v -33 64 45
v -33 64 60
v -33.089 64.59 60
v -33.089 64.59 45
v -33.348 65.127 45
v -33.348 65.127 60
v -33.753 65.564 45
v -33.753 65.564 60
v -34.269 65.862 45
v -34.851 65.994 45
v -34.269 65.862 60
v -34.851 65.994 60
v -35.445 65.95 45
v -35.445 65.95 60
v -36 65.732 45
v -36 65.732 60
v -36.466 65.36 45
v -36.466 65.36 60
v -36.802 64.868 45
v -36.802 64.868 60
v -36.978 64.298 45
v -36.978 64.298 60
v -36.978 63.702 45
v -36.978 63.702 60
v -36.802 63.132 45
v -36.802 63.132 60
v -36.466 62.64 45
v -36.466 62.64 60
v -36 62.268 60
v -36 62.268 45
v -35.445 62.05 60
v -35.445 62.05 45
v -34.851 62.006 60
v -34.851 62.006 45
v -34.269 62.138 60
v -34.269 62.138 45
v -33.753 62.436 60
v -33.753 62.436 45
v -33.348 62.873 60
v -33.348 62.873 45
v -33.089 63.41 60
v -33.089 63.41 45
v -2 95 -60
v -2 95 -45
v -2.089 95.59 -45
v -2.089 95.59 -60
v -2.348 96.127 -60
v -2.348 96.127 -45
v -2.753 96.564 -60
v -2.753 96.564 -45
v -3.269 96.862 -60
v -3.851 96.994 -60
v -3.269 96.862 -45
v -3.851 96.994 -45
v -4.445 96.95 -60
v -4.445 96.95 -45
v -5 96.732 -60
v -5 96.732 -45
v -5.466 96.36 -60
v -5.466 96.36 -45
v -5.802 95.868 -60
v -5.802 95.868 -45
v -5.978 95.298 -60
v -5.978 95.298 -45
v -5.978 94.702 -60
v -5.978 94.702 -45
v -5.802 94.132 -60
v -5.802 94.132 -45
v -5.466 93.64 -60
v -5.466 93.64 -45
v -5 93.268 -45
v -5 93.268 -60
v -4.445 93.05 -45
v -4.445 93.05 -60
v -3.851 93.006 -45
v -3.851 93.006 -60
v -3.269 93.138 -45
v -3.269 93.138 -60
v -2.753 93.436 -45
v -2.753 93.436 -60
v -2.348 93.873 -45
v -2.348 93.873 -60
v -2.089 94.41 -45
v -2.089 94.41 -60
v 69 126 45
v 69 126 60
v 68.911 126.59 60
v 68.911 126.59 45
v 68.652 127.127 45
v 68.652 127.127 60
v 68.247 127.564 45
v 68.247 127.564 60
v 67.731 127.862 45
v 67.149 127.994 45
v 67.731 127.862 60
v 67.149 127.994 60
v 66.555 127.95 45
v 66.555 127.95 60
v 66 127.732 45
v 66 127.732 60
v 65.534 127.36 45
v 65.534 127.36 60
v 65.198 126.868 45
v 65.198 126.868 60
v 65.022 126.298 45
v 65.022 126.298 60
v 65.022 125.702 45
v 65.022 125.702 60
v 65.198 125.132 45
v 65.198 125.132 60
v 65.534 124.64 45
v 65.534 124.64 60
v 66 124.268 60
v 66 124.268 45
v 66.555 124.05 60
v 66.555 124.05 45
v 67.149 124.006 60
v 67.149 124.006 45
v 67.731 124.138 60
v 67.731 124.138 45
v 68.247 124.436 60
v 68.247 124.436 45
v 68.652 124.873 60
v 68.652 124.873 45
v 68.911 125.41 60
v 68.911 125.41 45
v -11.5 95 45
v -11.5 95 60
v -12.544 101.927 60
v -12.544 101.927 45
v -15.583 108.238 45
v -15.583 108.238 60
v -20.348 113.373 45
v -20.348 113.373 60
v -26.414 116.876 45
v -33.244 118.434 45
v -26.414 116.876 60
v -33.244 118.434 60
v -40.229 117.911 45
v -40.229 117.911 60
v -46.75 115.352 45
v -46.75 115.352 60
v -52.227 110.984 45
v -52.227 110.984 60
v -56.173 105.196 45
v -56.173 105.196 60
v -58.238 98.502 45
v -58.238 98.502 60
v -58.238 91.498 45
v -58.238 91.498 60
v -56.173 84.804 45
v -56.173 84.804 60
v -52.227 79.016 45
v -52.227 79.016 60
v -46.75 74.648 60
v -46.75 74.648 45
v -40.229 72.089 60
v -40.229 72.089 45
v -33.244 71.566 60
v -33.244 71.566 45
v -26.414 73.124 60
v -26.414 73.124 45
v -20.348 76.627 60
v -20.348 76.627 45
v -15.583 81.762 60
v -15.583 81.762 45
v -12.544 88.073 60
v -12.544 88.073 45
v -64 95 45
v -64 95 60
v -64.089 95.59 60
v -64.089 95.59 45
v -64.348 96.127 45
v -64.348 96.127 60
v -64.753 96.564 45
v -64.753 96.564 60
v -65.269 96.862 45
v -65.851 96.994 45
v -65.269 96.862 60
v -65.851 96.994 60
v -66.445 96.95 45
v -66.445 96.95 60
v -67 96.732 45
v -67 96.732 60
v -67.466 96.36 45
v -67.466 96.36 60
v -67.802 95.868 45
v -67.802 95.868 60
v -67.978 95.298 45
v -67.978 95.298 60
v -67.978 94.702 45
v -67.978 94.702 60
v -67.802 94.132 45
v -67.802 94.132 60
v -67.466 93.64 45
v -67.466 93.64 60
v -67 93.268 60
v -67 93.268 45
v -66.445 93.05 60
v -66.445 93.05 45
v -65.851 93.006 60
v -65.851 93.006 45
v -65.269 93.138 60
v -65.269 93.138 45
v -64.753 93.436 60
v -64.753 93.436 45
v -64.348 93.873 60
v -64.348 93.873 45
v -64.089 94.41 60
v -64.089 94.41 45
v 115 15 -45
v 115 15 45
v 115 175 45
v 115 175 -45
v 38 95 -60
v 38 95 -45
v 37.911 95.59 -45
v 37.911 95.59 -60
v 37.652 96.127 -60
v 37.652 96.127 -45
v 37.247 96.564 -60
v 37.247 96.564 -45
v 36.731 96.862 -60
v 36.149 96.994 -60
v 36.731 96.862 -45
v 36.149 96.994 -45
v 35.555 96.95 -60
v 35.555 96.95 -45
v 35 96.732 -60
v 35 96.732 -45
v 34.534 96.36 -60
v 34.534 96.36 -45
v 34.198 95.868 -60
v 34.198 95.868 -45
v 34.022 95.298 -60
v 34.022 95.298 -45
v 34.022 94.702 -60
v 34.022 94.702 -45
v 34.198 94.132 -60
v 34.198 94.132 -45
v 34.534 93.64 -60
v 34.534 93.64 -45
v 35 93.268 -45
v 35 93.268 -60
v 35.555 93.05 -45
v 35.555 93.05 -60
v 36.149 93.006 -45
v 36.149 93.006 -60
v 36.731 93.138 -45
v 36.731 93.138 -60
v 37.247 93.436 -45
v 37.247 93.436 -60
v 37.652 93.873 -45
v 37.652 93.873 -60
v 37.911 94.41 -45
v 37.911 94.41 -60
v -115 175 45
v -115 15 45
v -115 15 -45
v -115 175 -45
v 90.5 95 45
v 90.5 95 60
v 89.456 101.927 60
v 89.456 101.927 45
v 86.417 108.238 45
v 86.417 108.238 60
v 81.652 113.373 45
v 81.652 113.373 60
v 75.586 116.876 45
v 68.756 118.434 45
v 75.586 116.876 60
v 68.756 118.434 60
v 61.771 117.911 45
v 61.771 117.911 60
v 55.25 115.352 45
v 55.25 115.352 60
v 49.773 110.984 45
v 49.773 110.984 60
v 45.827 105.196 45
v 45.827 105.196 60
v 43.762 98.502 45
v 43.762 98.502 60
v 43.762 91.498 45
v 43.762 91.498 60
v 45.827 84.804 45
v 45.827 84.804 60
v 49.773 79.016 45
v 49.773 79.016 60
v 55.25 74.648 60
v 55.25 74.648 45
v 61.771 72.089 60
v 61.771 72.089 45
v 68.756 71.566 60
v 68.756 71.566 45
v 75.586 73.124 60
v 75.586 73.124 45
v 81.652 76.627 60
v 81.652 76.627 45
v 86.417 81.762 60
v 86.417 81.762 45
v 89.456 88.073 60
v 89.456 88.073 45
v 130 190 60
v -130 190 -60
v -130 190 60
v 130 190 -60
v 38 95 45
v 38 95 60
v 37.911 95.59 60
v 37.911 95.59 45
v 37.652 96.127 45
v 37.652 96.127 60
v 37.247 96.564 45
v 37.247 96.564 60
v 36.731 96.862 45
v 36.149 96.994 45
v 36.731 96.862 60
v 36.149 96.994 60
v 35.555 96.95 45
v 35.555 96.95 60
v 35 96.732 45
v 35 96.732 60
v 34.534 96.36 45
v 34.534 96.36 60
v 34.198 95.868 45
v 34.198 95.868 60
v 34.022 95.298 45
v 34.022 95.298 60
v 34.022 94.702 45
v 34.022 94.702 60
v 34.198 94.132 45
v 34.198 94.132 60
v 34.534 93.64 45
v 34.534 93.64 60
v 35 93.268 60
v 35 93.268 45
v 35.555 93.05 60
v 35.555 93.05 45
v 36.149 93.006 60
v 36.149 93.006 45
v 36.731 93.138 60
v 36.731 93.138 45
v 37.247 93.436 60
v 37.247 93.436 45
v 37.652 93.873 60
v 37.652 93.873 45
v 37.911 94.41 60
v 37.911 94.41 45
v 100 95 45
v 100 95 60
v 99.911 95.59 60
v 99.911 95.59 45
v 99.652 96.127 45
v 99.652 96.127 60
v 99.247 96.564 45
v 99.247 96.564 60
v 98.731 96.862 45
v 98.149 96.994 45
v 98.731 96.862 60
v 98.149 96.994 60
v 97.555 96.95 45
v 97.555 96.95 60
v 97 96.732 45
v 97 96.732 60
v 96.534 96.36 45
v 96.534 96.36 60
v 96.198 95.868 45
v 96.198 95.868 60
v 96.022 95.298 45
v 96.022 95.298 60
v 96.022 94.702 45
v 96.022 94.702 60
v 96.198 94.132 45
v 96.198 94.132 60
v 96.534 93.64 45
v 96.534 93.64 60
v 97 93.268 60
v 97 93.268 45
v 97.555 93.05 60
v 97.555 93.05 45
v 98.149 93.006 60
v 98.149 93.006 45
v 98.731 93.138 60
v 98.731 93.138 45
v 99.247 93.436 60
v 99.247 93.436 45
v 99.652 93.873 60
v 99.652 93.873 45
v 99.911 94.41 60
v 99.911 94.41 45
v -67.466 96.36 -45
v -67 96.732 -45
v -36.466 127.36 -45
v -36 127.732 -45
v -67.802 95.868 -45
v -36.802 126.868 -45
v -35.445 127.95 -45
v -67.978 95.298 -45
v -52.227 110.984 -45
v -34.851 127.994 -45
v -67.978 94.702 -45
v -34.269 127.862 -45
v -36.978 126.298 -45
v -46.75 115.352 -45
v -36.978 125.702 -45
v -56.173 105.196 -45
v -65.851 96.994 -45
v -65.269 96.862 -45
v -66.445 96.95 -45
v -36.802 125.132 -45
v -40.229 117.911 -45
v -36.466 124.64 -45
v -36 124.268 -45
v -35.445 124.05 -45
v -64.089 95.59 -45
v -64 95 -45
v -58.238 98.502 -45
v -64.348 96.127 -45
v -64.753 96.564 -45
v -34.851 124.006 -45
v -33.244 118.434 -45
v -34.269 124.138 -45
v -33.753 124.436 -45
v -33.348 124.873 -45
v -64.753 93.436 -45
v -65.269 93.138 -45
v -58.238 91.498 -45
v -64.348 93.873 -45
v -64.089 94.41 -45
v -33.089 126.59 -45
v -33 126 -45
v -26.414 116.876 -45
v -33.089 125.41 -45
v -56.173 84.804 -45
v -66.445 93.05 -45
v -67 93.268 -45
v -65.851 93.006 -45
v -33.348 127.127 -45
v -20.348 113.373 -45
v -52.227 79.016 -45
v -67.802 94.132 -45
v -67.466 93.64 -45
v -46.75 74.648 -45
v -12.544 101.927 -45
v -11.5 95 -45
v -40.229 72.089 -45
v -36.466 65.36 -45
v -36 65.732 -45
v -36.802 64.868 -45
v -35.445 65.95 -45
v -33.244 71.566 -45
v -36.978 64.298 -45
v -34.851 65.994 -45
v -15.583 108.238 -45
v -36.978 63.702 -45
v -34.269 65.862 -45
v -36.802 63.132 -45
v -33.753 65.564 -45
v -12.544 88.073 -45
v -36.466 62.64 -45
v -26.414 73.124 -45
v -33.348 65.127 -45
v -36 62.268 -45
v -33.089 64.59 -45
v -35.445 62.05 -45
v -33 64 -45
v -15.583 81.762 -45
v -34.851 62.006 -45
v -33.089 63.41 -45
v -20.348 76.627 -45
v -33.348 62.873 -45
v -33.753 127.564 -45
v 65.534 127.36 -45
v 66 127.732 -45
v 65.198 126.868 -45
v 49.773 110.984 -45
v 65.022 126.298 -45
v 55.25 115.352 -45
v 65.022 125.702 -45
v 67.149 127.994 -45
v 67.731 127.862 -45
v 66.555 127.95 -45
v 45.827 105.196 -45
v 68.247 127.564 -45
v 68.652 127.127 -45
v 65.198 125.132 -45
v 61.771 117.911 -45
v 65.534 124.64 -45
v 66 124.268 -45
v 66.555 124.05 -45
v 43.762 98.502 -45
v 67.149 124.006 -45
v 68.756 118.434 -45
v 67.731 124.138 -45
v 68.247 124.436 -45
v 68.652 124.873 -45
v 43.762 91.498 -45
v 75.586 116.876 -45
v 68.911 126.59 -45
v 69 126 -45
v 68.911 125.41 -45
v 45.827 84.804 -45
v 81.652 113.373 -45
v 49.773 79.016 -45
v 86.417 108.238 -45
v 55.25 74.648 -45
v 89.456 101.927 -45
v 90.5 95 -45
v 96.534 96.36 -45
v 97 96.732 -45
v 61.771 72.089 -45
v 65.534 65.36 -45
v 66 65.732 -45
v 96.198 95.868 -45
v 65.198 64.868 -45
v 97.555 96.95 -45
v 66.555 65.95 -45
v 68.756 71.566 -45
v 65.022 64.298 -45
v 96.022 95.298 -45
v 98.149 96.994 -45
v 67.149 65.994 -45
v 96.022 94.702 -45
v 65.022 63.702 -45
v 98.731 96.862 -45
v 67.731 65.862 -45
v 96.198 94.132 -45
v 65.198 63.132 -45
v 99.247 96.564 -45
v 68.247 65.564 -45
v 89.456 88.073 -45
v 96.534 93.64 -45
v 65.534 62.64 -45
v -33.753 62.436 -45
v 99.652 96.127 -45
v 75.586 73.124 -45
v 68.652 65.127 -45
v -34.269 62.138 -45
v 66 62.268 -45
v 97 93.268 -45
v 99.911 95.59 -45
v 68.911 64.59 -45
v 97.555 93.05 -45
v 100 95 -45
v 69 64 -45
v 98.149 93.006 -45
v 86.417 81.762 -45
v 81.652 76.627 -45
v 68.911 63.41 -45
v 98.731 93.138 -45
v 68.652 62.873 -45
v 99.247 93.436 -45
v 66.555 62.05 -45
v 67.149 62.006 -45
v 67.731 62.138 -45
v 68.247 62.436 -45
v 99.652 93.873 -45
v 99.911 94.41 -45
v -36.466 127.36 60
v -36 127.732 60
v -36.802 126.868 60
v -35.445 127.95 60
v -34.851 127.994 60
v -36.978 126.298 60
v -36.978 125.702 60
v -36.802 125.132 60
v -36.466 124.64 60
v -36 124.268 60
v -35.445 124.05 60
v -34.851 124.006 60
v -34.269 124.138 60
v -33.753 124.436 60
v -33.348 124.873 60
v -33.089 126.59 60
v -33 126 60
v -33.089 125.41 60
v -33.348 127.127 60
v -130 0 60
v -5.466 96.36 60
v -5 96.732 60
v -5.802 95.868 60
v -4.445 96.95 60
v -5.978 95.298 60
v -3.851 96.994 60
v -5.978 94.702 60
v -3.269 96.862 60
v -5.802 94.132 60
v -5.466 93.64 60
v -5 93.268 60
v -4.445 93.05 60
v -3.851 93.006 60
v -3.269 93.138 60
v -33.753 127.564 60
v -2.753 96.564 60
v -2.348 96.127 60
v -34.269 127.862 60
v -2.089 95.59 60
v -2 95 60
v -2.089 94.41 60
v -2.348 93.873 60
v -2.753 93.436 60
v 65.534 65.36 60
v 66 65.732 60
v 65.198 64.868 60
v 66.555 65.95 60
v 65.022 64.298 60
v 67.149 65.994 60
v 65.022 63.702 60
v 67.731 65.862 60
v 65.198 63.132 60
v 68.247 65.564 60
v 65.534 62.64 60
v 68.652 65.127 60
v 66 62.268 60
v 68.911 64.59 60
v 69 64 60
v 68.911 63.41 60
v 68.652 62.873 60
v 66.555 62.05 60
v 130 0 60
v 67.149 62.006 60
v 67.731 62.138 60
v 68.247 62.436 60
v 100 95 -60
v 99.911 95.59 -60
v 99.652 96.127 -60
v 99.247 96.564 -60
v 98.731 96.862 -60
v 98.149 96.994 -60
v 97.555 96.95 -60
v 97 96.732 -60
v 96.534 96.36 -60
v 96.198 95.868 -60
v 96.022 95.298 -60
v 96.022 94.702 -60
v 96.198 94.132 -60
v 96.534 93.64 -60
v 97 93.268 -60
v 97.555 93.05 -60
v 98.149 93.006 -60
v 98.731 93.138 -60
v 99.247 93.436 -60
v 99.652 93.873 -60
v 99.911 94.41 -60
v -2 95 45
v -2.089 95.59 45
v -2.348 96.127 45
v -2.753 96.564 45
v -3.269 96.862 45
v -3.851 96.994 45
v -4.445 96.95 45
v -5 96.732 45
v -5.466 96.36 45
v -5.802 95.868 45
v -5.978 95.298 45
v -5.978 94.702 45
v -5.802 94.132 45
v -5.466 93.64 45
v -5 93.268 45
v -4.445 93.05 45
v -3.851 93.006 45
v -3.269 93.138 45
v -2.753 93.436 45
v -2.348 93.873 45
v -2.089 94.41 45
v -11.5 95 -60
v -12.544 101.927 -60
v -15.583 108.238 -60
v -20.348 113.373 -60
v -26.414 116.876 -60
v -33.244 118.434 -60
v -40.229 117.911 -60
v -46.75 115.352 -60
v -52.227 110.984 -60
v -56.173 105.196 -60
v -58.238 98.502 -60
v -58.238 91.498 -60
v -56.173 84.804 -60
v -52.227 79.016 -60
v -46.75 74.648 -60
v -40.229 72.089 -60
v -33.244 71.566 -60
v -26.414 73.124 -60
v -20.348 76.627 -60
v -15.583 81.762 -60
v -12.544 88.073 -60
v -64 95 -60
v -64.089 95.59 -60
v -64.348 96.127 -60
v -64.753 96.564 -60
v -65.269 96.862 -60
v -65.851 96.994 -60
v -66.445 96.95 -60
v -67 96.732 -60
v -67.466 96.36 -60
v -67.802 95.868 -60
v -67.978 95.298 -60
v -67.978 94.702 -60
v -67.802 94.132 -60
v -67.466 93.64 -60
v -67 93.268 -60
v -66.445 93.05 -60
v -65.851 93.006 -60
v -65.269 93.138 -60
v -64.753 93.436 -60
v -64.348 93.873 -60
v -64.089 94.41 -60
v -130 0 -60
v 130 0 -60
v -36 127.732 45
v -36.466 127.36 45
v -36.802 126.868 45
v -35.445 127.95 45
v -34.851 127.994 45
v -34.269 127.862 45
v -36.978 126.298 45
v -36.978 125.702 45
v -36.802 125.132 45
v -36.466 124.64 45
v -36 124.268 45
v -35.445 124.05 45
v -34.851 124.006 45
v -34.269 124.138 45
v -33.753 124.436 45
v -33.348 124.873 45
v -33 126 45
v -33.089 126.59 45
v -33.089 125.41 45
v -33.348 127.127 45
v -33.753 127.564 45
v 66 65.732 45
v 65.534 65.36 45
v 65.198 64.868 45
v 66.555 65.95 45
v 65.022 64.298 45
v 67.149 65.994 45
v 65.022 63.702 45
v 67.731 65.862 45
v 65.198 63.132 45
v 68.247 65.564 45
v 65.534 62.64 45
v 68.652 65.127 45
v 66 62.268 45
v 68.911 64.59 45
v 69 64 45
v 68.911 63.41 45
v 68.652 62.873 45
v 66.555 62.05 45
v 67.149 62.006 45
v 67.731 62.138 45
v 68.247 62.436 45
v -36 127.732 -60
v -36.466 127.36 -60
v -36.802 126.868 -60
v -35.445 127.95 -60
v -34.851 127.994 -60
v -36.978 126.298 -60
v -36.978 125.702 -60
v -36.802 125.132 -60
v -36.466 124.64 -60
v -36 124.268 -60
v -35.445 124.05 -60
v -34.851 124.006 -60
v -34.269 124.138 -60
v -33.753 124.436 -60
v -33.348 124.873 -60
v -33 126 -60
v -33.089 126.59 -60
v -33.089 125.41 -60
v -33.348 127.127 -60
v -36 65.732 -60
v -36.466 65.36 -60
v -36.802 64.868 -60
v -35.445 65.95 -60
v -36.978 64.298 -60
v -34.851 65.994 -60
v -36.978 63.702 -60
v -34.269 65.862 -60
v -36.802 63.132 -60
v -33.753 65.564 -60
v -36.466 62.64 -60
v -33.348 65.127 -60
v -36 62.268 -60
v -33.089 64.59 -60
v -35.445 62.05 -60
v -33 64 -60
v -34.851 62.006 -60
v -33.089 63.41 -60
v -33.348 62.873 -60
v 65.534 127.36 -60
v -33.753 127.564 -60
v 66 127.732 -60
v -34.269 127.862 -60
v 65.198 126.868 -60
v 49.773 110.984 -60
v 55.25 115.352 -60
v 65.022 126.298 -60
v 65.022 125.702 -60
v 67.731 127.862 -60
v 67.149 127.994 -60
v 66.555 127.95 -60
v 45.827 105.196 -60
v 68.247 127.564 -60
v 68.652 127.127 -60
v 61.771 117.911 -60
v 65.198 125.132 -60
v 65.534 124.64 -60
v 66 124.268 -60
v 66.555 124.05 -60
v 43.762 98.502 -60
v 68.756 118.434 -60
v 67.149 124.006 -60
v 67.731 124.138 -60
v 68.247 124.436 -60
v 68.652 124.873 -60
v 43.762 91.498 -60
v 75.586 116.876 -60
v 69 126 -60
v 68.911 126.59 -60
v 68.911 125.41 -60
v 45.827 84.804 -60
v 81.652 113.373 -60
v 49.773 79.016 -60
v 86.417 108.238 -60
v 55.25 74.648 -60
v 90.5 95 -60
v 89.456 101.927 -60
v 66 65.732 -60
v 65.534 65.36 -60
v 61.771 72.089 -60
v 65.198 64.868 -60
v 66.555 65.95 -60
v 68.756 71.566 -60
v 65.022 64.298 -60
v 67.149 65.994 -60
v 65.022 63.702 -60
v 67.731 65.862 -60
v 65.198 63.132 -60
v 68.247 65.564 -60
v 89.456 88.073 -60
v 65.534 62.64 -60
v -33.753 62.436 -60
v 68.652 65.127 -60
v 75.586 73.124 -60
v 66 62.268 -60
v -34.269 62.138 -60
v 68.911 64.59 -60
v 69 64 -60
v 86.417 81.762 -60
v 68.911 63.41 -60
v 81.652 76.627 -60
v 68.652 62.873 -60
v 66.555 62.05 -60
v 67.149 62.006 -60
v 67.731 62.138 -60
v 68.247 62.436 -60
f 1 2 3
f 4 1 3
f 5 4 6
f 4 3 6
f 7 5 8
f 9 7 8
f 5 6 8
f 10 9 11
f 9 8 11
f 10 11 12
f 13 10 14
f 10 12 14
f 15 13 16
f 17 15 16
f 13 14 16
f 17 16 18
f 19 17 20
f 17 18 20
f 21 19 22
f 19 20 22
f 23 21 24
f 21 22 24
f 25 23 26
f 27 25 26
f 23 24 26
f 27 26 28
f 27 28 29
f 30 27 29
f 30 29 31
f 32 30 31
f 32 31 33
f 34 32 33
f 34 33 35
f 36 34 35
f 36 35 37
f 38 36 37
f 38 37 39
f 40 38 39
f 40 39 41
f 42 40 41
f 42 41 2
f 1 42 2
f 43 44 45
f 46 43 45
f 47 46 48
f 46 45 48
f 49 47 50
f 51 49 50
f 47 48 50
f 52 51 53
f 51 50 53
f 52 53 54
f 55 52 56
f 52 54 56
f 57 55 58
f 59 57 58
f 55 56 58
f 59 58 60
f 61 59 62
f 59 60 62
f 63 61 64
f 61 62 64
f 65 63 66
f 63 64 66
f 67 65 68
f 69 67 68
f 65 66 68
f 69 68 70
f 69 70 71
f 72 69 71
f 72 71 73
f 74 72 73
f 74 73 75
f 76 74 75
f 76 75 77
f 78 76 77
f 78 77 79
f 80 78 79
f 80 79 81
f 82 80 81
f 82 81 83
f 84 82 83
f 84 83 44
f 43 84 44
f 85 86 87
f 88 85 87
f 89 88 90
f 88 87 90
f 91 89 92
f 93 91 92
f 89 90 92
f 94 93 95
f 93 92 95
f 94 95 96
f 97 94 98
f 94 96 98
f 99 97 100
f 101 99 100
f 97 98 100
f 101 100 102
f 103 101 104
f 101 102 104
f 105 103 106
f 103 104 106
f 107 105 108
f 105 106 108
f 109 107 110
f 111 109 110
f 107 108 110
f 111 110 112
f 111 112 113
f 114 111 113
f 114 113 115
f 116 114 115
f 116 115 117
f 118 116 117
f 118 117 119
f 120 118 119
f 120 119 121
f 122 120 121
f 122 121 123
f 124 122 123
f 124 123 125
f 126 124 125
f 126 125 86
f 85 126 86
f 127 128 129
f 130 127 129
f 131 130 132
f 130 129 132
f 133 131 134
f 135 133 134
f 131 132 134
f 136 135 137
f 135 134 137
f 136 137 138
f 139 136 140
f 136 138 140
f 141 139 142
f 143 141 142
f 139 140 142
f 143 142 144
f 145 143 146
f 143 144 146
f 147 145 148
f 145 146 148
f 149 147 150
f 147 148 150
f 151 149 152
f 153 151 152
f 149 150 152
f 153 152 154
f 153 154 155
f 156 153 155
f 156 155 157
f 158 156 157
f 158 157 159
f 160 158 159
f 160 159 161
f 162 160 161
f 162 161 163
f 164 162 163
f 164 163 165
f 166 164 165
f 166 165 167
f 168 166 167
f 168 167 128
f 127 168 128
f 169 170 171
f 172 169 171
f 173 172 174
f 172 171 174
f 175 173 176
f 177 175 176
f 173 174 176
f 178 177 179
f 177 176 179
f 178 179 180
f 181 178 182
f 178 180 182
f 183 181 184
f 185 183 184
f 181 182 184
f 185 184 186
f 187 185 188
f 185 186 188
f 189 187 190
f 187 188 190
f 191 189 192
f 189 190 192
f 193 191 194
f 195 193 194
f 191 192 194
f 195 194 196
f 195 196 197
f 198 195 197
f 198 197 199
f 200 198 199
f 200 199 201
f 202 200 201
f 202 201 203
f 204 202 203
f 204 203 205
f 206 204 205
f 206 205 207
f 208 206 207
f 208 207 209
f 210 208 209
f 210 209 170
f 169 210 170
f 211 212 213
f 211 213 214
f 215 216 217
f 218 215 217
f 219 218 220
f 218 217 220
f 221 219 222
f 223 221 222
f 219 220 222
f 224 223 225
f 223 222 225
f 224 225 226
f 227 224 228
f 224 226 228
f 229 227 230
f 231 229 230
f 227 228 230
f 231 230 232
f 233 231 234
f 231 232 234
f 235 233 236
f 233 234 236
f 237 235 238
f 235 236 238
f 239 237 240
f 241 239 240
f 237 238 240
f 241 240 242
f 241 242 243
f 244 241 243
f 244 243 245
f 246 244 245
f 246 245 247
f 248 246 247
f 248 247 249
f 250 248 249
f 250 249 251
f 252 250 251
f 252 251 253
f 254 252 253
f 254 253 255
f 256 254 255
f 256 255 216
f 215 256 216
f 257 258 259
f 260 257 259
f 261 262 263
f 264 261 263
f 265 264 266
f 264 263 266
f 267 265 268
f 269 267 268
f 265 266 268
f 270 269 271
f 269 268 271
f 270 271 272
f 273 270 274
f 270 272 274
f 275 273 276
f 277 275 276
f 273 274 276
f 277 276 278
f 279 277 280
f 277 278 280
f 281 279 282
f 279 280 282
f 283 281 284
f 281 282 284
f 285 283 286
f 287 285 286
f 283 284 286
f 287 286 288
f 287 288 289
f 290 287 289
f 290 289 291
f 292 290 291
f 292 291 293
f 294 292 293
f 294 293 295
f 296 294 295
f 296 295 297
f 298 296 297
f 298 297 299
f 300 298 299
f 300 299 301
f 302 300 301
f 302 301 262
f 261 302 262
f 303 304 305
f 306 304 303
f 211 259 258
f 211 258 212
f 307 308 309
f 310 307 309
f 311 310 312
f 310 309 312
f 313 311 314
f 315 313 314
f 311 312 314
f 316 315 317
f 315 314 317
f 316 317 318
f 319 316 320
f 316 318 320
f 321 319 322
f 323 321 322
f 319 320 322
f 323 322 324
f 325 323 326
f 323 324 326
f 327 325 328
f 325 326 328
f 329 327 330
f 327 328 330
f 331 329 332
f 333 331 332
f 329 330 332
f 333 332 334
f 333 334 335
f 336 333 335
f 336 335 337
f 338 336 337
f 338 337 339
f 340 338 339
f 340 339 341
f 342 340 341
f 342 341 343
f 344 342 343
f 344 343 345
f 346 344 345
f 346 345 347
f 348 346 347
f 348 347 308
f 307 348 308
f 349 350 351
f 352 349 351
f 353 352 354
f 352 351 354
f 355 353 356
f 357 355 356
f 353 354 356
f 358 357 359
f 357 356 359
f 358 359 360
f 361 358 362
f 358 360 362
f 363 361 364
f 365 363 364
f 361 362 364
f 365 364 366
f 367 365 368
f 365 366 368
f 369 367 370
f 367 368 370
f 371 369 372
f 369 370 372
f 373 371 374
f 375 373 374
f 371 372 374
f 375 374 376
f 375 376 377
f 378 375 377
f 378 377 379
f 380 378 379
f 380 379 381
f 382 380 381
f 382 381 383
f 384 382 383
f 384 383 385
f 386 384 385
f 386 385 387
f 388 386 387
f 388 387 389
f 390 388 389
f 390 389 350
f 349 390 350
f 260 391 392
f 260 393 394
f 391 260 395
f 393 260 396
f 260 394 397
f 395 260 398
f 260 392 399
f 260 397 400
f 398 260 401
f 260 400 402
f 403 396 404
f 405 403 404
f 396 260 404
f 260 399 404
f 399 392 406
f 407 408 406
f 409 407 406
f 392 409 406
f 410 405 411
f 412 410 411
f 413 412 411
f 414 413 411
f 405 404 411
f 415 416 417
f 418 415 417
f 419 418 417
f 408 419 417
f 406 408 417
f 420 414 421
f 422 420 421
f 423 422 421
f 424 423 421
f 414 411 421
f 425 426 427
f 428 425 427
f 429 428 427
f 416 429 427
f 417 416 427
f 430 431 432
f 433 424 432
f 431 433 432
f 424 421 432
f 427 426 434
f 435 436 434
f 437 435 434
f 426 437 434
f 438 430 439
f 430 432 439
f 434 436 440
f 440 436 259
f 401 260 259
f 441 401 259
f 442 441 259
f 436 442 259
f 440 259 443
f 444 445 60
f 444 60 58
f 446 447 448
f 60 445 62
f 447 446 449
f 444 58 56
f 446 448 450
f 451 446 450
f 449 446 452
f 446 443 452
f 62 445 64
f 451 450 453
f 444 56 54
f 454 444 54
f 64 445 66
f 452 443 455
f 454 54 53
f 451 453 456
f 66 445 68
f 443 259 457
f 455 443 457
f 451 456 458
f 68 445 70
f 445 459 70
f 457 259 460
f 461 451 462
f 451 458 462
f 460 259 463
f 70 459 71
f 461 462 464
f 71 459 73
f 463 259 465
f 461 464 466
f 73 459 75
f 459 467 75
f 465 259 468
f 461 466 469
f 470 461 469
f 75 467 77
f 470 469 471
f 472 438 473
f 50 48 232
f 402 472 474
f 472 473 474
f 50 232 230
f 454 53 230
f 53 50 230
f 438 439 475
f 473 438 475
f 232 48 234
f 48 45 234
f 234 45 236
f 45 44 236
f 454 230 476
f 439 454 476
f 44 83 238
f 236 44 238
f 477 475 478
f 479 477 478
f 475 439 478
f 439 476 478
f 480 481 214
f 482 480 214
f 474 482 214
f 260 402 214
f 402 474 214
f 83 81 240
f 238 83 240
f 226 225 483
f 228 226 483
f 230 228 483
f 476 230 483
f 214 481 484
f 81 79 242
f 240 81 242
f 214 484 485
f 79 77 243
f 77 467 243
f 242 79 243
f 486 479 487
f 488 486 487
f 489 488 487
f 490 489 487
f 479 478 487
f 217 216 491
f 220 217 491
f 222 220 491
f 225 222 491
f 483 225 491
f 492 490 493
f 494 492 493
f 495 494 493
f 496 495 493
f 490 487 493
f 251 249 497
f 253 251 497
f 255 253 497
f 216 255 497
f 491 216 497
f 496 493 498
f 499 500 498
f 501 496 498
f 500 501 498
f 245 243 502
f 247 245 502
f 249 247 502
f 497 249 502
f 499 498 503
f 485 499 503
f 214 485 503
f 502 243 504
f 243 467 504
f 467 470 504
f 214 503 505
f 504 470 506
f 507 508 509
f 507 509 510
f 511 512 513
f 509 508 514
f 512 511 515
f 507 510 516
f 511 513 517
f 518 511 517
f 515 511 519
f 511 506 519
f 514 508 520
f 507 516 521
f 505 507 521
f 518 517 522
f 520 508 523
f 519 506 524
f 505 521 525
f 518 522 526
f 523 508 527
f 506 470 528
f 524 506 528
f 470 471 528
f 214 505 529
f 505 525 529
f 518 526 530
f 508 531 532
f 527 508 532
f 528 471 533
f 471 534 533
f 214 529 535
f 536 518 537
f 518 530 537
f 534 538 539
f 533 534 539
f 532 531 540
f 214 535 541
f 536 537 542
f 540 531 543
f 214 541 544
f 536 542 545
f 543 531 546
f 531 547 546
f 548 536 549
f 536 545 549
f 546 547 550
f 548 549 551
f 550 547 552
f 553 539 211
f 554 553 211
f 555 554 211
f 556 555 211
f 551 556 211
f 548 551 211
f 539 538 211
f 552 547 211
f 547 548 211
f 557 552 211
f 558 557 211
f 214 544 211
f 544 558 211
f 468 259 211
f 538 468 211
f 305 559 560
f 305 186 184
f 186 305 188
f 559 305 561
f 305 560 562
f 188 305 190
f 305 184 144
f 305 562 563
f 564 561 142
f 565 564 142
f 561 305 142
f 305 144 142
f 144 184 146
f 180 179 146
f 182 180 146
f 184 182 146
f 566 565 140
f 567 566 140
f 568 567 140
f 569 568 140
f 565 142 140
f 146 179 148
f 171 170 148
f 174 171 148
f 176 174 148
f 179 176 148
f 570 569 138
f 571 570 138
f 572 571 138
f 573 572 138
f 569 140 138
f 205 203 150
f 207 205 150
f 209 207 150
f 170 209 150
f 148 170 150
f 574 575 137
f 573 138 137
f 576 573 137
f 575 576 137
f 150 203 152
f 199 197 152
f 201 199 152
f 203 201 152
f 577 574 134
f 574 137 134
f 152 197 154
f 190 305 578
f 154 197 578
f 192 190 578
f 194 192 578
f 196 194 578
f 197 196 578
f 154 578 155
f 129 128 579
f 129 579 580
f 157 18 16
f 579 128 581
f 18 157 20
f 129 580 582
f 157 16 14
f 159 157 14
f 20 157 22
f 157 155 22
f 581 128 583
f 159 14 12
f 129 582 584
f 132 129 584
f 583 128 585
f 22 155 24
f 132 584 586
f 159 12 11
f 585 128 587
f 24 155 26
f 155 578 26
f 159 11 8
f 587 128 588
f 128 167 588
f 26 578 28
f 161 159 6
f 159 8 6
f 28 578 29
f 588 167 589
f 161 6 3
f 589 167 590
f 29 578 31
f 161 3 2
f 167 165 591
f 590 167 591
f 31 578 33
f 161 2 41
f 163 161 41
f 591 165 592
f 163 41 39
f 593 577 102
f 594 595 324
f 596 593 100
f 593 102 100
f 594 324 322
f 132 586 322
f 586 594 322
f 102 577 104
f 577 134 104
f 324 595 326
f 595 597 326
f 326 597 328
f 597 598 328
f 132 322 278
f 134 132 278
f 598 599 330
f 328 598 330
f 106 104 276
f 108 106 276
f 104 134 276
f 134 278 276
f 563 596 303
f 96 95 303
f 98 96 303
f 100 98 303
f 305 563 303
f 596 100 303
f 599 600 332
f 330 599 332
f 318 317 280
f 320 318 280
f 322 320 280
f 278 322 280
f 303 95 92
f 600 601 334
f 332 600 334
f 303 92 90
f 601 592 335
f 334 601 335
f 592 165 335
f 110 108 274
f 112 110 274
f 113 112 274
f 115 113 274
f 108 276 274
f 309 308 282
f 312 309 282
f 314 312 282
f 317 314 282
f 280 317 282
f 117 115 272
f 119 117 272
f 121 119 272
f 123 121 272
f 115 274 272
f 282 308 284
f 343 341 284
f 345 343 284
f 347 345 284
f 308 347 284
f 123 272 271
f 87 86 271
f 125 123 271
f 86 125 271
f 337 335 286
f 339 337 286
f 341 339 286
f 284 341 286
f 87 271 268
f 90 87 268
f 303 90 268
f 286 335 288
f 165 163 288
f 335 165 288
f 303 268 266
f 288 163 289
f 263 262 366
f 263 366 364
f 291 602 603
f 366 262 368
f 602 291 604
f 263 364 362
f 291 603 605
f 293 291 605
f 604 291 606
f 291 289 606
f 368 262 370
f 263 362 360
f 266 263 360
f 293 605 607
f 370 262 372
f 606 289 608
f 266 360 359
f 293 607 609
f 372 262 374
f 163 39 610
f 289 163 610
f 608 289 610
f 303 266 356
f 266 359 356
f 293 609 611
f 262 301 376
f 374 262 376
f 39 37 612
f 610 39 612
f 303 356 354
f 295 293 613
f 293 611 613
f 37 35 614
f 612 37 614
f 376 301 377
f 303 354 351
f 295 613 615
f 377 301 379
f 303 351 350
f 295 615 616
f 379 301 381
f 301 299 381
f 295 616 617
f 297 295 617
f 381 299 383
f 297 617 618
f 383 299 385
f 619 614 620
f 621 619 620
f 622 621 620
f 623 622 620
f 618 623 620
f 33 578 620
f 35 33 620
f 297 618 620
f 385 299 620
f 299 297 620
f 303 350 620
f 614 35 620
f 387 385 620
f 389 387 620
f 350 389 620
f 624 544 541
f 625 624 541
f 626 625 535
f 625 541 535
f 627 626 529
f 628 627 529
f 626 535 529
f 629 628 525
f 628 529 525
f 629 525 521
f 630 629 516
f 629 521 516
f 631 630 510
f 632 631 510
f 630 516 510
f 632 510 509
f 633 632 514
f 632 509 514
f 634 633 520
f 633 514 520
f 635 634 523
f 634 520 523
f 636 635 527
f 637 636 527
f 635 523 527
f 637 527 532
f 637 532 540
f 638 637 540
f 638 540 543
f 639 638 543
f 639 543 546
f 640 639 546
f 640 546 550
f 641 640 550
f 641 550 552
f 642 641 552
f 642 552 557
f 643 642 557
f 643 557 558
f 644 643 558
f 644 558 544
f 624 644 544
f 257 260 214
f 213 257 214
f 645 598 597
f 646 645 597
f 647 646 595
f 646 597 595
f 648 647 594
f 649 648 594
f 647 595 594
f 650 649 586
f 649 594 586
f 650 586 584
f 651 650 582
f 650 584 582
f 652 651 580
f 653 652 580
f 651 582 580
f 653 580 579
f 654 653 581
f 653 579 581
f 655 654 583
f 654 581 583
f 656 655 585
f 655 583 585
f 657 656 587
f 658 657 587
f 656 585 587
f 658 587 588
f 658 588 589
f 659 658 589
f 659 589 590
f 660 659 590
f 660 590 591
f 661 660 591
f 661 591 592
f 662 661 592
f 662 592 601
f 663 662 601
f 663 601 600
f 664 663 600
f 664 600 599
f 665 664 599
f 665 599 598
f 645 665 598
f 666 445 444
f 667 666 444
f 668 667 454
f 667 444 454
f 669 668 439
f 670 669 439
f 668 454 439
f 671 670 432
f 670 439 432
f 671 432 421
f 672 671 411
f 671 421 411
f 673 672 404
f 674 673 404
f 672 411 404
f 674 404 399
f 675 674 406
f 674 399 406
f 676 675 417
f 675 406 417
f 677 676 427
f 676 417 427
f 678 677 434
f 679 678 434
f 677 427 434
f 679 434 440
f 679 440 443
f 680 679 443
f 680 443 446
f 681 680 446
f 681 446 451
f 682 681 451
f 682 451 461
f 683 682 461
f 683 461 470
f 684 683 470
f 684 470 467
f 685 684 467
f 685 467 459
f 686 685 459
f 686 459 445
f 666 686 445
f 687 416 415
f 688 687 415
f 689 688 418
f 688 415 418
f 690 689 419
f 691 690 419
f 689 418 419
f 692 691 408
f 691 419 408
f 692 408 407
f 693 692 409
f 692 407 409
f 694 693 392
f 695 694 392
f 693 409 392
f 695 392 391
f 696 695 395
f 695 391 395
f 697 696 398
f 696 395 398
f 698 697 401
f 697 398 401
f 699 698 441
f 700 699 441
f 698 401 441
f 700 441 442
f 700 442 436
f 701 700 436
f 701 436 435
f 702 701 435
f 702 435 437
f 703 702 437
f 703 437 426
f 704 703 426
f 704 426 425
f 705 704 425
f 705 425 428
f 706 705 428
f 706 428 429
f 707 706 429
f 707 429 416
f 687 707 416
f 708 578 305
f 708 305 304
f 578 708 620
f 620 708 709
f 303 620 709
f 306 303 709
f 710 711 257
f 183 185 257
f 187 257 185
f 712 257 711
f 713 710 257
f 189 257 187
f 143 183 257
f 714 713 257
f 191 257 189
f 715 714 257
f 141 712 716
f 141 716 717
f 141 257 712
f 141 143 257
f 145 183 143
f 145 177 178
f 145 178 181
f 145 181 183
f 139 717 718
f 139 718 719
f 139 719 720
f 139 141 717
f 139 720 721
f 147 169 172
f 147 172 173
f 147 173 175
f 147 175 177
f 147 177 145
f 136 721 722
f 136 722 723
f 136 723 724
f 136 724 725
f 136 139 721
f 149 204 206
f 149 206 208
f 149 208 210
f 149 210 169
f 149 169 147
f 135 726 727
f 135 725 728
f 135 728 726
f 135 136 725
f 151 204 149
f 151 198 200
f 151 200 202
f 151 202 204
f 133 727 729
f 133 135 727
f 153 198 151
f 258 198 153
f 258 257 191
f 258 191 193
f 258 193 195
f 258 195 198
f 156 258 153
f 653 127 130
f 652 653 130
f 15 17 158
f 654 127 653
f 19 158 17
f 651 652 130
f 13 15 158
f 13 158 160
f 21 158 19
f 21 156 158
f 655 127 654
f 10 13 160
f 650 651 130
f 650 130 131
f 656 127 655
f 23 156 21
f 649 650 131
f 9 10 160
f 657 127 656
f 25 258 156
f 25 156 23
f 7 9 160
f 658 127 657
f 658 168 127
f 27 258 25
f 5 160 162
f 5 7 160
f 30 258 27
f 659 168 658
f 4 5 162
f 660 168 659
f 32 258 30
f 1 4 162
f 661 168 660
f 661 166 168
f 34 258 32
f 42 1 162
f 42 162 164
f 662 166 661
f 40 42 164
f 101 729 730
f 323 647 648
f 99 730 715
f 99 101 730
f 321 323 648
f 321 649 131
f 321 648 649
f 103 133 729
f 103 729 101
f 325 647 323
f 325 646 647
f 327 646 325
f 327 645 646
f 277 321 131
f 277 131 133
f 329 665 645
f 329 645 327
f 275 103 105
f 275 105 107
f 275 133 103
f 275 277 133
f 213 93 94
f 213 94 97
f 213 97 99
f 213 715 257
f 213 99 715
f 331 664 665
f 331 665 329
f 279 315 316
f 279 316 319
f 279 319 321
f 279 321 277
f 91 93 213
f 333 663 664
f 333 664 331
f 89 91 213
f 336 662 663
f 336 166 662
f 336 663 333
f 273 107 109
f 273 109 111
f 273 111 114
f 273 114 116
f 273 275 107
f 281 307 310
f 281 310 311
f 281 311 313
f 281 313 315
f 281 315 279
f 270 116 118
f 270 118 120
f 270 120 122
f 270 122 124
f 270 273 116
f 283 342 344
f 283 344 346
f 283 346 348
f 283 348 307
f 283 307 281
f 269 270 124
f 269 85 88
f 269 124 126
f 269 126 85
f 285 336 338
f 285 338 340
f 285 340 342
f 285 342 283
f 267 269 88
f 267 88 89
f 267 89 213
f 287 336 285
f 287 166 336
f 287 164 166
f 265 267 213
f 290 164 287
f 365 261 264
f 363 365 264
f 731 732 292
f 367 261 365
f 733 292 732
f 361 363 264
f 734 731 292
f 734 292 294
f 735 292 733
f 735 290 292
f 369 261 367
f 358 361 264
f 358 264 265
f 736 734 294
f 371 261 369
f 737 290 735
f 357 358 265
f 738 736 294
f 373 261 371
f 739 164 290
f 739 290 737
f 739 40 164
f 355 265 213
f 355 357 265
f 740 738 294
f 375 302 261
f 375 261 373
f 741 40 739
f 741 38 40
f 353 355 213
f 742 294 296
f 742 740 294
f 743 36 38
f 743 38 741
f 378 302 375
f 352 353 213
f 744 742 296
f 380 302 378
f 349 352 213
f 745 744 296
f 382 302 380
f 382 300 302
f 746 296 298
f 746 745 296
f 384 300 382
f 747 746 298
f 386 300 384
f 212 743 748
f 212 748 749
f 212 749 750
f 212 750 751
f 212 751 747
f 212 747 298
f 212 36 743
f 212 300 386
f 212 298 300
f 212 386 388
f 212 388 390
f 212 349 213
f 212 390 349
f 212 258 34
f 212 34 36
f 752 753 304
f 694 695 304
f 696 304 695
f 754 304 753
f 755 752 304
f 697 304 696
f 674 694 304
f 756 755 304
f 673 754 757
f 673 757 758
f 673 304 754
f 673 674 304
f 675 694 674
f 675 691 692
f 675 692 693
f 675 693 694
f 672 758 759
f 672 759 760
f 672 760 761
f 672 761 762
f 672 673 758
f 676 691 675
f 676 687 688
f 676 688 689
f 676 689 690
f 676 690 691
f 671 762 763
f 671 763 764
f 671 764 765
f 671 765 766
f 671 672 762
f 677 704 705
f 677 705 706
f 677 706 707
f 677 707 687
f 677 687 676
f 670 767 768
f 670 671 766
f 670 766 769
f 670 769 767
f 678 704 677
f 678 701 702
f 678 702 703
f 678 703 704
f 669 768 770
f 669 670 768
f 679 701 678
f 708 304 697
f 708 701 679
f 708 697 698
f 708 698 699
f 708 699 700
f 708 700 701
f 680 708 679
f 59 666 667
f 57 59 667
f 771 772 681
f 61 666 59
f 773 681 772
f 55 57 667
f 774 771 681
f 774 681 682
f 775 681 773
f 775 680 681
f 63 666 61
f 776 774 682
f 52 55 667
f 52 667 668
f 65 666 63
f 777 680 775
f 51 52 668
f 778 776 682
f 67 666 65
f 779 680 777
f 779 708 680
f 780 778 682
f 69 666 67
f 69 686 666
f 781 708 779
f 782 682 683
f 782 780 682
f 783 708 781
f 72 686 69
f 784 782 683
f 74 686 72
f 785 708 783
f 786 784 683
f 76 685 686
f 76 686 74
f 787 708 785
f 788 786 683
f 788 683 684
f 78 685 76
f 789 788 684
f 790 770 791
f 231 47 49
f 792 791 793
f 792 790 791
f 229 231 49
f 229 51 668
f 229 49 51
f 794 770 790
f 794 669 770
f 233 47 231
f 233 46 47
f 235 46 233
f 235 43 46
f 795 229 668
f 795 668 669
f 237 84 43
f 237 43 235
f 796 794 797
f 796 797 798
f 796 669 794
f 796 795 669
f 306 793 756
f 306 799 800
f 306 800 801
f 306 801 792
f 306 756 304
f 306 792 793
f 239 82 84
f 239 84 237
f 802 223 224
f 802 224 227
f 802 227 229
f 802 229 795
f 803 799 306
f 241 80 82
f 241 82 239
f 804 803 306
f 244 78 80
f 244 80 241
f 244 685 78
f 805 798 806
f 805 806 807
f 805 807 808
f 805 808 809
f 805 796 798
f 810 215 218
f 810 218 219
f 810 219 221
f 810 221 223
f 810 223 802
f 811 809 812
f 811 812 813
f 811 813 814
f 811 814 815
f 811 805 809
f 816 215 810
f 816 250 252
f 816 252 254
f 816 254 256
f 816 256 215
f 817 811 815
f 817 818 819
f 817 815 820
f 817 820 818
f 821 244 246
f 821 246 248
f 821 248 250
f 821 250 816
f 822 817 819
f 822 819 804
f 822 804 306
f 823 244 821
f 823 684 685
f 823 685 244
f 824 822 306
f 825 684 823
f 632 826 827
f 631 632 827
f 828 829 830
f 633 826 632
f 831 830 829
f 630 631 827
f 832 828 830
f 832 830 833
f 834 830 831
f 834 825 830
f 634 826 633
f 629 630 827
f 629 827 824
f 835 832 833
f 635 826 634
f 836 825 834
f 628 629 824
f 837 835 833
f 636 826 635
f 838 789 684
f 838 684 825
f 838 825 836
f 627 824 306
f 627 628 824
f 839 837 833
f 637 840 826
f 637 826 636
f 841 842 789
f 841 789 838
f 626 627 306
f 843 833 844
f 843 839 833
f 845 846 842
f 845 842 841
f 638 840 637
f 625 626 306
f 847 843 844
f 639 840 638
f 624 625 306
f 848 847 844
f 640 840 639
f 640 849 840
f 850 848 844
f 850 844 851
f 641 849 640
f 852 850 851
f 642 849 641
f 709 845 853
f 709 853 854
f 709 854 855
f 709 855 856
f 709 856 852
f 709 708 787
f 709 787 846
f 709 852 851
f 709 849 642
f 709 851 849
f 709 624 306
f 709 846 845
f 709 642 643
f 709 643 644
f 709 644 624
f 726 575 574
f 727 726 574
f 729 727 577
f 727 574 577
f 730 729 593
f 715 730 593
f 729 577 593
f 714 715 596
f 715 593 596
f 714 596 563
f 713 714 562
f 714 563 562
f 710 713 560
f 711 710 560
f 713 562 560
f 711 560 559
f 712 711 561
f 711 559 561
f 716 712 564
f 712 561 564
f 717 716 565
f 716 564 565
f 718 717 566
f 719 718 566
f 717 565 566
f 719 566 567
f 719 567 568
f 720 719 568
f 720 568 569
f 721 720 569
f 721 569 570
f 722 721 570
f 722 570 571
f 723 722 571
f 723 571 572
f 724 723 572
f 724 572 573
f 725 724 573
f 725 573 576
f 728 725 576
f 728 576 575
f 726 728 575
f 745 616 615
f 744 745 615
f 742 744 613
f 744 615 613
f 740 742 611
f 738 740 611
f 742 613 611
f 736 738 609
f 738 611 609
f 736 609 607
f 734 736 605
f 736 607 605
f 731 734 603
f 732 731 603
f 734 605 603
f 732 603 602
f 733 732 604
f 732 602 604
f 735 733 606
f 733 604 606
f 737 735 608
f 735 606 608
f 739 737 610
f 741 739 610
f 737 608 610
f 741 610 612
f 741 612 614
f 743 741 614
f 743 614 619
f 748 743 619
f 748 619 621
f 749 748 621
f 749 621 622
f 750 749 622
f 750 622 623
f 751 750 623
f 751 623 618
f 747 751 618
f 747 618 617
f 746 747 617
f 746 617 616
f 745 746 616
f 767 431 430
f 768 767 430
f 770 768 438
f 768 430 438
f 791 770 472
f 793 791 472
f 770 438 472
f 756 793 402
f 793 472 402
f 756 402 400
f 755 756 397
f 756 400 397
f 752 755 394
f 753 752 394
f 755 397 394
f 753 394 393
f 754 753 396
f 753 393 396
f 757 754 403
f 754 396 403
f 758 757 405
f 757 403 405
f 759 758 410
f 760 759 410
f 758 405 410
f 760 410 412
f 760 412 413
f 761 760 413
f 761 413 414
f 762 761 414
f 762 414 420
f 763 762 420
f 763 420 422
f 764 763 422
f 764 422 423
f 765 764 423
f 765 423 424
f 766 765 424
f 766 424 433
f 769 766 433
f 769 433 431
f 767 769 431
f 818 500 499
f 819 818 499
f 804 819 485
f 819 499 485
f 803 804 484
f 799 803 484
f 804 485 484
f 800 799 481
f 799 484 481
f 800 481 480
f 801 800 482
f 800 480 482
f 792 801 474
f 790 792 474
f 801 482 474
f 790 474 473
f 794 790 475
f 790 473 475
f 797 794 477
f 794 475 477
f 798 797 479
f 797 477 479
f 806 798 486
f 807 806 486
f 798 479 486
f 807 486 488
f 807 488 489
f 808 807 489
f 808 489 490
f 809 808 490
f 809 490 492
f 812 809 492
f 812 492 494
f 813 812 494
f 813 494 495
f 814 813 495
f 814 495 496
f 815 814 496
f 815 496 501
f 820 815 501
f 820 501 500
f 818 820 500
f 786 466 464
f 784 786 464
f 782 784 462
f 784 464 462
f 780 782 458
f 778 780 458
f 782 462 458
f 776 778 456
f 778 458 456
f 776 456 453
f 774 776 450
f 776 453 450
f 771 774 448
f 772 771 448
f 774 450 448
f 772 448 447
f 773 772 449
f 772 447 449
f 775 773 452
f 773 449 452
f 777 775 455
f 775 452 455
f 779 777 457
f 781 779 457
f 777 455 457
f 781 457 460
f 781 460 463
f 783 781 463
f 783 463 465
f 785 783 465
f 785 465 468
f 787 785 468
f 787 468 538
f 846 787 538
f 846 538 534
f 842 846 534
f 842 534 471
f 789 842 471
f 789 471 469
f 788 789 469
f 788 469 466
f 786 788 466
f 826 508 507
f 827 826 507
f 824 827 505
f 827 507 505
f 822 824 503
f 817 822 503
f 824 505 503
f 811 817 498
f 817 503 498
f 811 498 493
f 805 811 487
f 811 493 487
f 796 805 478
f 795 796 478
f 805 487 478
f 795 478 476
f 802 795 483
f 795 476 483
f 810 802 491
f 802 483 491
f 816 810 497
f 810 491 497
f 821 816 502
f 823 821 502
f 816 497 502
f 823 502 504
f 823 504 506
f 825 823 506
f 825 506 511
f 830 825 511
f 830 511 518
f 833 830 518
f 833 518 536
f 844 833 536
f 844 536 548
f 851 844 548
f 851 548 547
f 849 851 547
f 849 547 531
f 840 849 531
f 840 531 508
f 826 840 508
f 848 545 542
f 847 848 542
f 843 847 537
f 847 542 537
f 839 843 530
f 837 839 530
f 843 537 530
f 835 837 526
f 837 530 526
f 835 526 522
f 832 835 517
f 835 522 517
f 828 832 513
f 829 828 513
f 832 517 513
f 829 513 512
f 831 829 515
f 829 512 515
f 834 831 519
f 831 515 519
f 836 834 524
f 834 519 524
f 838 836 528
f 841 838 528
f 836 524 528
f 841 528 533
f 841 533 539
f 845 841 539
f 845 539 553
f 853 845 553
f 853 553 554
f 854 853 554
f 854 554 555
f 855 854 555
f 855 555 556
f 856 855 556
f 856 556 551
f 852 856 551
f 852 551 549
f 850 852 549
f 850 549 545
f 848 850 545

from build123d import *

# Parameters (mm, degrees)
SKETCH1_W           = 260
SKETCH1_H           = 120
BOSS_EXTRUDE1_DEPTH = 190
SHELL1_T            = 15
SKETCH2_R           = 15
CUT_EXTRUDE1_DEPTH  = 260.615099715
SKETCH3_R           = 23.5
CUT_EXTRUDE2_DEPTH  = 260.615099715
SKETCH4_R           = 2
CUT_EXTRUDE3_DEPTH  = 260.615099715


with BuildPart() as part:
    # Sketch1 → Boss-Extrude1 (new body)
    with BuildSketch(Plane(origin=(0, 0, 0), x_dir=(1, 0, 0), z_dir=(0, 1, 0))):
        Rectangle(SKETCH1_W, SKETCH1_H)
    extrude(amount=BOSS_EXTRUDE1_DEPTH)

    # Shell1 (no face opened: a closed hollow body)
    add(offset(amount=-SHELL1_T, mode=Mode.PRIVATE), mode=Mode.SUBTRACT)

    # Sketch2 → Cut-Extrude1 (cut, through all)
    with BuildSketch(Plane.XY.offset(60)):
        with Locations((-35, 95)):
            Circle(SKETCH2_R)
        with Locations((67, 95)):
            Circle(SKETCH2_R)
    extrude(amount=-CUT_EXTRUDE1_DEPTH, mode=Mode.SUBTRACT)

    # Sketch3 → Cut-Extrude2 (cut, through all)
    with BuildSketch(Plane.XY.offset(60)):
        with Locations((-35, 95)):
            Circle(SKETCH3_R)
        with Locations((67, 95)):
            Circle(SKETCH3_R)
    extrude(amount=-CUT_EXTRUDE2_DEPTH, mode=Mode.SUBTRACT)

    # Sketch4 → Cut-Extrude3 (cut, through all)
    with BuildSketch(Plane.XY.offset(60)):
        with Locations((36, 95)):
            Circle(SKETCH4_R)
        with Locations((67, 126)):
            Circle(SKETCH4_R)
        with Locations((98, 95)):
            Circle(SKETCH4_R)
        with Locations((67, 64)):
            Circle(SKETCH4_R)
        with Locations((-4, 95)):
            Circle(SKETCH4_R)
        with Locations((-35, 64)):
            Circle(SKETCH4_R)
        with Locations((-66, 95)):
            Circle(SKETCH4_R)
        with Locations((-35, 126)):
            Circle(SKETCH4_R)
    extrude(amount=-CUT_EXTRUDE3_DEPTH, mode=Mode.SUBTRACT)


solid = part.part
